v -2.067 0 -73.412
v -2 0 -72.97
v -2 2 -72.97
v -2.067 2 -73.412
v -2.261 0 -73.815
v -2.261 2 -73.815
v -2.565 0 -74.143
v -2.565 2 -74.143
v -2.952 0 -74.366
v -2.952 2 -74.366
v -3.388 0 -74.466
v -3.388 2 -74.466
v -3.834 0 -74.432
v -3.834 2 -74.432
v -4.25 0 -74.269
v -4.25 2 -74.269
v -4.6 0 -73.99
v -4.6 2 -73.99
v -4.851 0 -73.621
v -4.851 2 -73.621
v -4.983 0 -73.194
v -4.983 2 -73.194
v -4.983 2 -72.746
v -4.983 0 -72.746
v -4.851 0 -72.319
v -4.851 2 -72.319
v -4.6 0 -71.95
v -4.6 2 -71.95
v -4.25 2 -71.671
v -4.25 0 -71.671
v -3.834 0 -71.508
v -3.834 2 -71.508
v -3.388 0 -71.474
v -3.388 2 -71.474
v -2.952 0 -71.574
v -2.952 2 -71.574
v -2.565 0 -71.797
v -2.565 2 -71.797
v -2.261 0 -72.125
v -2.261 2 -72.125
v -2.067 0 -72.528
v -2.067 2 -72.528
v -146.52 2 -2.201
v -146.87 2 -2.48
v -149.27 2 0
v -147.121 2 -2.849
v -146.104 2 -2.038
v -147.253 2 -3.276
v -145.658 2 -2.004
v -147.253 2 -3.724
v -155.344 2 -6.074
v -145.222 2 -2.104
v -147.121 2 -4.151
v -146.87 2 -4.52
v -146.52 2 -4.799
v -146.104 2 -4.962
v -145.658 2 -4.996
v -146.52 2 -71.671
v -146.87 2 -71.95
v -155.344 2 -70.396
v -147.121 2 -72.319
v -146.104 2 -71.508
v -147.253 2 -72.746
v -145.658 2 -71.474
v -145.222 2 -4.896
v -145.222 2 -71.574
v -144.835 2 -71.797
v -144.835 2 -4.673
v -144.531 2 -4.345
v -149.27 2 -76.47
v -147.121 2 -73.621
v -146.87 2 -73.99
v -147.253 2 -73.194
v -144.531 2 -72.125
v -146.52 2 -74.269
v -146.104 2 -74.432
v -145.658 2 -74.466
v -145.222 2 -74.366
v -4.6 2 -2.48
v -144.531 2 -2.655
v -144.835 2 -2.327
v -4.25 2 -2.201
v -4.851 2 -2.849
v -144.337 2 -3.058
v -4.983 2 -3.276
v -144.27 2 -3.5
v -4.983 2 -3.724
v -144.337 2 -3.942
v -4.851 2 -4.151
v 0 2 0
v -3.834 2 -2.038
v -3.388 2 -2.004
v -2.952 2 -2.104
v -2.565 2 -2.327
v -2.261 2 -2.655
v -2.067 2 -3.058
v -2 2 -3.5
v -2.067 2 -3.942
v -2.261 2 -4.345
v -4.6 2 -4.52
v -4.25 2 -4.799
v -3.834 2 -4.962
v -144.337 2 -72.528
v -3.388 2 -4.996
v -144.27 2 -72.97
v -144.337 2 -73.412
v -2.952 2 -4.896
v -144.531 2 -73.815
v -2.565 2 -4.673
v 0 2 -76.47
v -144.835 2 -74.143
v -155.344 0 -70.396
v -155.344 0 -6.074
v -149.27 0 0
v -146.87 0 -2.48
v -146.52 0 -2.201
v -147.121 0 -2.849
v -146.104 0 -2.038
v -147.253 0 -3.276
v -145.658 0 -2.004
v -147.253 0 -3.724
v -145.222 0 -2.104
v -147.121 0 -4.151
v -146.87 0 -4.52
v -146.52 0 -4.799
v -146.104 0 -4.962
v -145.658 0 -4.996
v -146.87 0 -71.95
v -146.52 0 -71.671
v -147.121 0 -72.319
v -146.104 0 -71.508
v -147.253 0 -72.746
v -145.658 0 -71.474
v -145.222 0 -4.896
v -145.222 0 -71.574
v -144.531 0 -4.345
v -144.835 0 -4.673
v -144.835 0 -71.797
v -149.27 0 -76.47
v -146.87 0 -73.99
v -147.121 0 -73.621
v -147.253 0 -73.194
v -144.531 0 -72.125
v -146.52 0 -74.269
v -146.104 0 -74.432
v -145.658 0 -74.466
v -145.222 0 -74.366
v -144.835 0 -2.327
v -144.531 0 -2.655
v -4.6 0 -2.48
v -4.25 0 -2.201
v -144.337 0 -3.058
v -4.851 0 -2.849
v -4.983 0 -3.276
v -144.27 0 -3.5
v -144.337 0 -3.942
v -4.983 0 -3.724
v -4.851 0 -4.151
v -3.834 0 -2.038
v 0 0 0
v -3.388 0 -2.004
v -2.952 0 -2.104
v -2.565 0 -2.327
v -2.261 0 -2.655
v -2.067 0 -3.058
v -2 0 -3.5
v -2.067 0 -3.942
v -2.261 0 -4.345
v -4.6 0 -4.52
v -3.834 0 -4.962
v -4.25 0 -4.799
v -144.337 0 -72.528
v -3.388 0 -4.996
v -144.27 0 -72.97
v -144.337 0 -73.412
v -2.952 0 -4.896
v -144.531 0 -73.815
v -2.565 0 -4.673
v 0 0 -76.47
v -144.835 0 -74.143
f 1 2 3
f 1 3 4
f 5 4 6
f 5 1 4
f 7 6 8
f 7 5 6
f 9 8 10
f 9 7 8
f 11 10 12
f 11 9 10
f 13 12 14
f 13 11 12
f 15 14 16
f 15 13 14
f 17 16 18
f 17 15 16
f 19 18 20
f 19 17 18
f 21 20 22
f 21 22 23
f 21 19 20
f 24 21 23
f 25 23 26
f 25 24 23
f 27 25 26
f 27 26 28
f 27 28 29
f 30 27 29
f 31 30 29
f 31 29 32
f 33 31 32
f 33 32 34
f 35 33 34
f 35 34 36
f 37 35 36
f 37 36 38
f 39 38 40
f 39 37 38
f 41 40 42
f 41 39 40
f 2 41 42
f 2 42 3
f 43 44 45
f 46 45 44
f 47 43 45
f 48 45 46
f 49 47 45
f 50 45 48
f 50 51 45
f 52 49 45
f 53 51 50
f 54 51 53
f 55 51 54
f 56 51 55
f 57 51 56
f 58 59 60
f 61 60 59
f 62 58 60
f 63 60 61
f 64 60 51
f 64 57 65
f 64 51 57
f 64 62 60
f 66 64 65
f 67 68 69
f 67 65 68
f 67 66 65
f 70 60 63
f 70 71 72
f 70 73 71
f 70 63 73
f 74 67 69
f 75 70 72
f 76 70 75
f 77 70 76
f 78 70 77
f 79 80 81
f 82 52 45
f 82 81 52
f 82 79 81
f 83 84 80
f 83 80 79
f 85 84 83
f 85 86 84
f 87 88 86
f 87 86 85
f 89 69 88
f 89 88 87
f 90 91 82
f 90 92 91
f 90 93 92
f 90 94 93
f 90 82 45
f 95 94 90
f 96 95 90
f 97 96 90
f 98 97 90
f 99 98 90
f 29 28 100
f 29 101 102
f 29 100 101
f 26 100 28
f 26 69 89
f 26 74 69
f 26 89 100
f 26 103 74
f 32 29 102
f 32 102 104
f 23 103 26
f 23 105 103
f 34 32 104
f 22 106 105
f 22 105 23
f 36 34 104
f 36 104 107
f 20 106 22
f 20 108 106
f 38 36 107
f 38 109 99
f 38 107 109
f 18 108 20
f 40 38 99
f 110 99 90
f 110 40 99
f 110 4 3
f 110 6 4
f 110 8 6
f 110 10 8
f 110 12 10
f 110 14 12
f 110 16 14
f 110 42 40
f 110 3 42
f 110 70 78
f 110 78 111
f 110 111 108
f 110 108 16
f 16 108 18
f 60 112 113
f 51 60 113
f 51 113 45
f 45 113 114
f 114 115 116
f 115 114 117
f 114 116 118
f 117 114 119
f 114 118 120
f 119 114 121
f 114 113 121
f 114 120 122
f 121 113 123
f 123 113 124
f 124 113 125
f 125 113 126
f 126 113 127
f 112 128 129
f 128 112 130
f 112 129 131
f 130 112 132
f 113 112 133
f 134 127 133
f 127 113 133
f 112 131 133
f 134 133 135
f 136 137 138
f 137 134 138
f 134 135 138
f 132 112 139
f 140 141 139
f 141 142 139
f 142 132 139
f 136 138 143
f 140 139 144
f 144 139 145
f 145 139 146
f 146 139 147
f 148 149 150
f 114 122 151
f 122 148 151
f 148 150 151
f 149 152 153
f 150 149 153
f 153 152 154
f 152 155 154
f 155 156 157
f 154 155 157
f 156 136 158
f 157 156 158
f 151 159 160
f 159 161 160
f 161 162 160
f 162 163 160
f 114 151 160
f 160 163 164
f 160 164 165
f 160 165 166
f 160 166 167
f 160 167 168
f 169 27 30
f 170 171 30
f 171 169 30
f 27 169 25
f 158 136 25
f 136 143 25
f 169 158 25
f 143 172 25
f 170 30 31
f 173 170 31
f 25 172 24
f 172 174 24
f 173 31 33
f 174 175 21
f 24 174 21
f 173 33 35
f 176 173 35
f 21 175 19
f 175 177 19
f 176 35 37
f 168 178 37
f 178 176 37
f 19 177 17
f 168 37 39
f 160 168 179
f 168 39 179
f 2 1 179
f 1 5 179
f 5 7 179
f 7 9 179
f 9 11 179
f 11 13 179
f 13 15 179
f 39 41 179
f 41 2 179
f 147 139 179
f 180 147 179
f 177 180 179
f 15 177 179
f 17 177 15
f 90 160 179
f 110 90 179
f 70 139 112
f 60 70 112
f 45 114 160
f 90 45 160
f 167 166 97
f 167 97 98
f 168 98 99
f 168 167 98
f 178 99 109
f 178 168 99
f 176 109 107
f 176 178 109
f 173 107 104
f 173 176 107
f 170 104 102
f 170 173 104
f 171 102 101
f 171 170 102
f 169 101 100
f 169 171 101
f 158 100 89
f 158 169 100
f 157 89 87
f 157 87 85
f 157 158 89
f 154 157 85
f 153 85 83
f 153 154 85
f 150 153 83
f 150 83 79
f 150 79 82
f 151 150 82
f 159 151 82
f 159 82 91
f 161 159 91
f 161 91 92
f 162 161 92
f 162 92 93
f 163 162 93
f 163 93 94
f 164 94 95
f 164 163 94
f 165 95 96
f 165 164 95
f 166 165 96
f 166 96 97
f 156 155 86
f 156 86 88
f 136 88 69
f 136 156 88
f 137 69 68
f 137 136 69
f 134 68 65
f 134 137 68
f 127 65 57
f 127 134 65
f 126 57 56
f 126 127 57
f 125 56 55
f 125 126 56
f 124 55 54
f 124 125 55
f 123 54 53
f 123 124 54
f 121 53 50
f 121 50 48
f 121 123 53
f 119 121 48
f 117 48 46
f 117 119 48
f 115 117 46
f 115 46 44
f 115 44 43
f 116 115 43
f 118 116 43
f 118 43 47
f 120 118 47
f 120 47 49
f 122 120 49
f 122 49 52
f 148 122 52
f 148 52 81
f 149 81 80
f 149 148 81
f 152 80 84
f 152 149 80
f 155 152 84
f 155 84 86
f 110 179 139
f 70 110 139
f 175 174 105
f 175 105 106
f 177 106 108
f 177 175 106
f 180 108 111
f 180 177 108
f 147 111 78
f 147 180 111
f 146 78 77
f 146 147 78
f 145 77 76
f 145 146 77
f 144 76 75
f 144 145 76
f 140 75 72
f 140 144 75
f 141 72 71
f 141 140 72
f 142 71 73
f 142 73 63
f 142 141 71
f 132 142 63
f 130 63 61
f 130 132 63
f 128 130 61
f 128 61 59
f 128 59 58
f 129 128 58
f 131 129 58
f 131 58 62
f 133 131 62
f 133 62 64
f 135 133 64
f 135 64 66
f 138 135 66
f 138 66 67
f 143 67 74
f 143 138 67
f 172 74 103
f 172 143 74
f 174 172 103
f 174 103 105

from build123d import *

# Parameters (mm, degrees)
SKETCH2_R           = 1.5
BOSS_EXTRUDE1_DEPTH = 2


with BuildPart() as part:
    # Sketch2 → Boss-Extrude1 (new body)
    with BuildSketch(Plane(origin=(0, 0, 0), x_dir=(1, 0, 0), z_dir=(0, 1, 0))):
        Polygon((-149.27, 76.47), (-155.34404725, 70.39595275), (-155.34404725, 6.07404725), (-149.27, 0), (0, 0), (0, 76.47), align=None)
        with Locations((-3.5, 72.97)):
            Circle(SKETCH2_R, mode=Mode.SUBTRACT)
        with Locations((-3.5, 3.5)):
            Circle(SKETCH2_R, mode=Mode.SUBTRACT)
        with Locations((-145.77, 72.97)):
            Circle(SKETCH2_R, mode=Mode.SUBTRACT)
        with Locations((-145.77, 3.5)):
            Circle(SKETCH2_R, mode=Mode.SUBTRACT)
    extrude(amount=BOSS_EXTRUDE1_DEPTH)


solid = part.part
